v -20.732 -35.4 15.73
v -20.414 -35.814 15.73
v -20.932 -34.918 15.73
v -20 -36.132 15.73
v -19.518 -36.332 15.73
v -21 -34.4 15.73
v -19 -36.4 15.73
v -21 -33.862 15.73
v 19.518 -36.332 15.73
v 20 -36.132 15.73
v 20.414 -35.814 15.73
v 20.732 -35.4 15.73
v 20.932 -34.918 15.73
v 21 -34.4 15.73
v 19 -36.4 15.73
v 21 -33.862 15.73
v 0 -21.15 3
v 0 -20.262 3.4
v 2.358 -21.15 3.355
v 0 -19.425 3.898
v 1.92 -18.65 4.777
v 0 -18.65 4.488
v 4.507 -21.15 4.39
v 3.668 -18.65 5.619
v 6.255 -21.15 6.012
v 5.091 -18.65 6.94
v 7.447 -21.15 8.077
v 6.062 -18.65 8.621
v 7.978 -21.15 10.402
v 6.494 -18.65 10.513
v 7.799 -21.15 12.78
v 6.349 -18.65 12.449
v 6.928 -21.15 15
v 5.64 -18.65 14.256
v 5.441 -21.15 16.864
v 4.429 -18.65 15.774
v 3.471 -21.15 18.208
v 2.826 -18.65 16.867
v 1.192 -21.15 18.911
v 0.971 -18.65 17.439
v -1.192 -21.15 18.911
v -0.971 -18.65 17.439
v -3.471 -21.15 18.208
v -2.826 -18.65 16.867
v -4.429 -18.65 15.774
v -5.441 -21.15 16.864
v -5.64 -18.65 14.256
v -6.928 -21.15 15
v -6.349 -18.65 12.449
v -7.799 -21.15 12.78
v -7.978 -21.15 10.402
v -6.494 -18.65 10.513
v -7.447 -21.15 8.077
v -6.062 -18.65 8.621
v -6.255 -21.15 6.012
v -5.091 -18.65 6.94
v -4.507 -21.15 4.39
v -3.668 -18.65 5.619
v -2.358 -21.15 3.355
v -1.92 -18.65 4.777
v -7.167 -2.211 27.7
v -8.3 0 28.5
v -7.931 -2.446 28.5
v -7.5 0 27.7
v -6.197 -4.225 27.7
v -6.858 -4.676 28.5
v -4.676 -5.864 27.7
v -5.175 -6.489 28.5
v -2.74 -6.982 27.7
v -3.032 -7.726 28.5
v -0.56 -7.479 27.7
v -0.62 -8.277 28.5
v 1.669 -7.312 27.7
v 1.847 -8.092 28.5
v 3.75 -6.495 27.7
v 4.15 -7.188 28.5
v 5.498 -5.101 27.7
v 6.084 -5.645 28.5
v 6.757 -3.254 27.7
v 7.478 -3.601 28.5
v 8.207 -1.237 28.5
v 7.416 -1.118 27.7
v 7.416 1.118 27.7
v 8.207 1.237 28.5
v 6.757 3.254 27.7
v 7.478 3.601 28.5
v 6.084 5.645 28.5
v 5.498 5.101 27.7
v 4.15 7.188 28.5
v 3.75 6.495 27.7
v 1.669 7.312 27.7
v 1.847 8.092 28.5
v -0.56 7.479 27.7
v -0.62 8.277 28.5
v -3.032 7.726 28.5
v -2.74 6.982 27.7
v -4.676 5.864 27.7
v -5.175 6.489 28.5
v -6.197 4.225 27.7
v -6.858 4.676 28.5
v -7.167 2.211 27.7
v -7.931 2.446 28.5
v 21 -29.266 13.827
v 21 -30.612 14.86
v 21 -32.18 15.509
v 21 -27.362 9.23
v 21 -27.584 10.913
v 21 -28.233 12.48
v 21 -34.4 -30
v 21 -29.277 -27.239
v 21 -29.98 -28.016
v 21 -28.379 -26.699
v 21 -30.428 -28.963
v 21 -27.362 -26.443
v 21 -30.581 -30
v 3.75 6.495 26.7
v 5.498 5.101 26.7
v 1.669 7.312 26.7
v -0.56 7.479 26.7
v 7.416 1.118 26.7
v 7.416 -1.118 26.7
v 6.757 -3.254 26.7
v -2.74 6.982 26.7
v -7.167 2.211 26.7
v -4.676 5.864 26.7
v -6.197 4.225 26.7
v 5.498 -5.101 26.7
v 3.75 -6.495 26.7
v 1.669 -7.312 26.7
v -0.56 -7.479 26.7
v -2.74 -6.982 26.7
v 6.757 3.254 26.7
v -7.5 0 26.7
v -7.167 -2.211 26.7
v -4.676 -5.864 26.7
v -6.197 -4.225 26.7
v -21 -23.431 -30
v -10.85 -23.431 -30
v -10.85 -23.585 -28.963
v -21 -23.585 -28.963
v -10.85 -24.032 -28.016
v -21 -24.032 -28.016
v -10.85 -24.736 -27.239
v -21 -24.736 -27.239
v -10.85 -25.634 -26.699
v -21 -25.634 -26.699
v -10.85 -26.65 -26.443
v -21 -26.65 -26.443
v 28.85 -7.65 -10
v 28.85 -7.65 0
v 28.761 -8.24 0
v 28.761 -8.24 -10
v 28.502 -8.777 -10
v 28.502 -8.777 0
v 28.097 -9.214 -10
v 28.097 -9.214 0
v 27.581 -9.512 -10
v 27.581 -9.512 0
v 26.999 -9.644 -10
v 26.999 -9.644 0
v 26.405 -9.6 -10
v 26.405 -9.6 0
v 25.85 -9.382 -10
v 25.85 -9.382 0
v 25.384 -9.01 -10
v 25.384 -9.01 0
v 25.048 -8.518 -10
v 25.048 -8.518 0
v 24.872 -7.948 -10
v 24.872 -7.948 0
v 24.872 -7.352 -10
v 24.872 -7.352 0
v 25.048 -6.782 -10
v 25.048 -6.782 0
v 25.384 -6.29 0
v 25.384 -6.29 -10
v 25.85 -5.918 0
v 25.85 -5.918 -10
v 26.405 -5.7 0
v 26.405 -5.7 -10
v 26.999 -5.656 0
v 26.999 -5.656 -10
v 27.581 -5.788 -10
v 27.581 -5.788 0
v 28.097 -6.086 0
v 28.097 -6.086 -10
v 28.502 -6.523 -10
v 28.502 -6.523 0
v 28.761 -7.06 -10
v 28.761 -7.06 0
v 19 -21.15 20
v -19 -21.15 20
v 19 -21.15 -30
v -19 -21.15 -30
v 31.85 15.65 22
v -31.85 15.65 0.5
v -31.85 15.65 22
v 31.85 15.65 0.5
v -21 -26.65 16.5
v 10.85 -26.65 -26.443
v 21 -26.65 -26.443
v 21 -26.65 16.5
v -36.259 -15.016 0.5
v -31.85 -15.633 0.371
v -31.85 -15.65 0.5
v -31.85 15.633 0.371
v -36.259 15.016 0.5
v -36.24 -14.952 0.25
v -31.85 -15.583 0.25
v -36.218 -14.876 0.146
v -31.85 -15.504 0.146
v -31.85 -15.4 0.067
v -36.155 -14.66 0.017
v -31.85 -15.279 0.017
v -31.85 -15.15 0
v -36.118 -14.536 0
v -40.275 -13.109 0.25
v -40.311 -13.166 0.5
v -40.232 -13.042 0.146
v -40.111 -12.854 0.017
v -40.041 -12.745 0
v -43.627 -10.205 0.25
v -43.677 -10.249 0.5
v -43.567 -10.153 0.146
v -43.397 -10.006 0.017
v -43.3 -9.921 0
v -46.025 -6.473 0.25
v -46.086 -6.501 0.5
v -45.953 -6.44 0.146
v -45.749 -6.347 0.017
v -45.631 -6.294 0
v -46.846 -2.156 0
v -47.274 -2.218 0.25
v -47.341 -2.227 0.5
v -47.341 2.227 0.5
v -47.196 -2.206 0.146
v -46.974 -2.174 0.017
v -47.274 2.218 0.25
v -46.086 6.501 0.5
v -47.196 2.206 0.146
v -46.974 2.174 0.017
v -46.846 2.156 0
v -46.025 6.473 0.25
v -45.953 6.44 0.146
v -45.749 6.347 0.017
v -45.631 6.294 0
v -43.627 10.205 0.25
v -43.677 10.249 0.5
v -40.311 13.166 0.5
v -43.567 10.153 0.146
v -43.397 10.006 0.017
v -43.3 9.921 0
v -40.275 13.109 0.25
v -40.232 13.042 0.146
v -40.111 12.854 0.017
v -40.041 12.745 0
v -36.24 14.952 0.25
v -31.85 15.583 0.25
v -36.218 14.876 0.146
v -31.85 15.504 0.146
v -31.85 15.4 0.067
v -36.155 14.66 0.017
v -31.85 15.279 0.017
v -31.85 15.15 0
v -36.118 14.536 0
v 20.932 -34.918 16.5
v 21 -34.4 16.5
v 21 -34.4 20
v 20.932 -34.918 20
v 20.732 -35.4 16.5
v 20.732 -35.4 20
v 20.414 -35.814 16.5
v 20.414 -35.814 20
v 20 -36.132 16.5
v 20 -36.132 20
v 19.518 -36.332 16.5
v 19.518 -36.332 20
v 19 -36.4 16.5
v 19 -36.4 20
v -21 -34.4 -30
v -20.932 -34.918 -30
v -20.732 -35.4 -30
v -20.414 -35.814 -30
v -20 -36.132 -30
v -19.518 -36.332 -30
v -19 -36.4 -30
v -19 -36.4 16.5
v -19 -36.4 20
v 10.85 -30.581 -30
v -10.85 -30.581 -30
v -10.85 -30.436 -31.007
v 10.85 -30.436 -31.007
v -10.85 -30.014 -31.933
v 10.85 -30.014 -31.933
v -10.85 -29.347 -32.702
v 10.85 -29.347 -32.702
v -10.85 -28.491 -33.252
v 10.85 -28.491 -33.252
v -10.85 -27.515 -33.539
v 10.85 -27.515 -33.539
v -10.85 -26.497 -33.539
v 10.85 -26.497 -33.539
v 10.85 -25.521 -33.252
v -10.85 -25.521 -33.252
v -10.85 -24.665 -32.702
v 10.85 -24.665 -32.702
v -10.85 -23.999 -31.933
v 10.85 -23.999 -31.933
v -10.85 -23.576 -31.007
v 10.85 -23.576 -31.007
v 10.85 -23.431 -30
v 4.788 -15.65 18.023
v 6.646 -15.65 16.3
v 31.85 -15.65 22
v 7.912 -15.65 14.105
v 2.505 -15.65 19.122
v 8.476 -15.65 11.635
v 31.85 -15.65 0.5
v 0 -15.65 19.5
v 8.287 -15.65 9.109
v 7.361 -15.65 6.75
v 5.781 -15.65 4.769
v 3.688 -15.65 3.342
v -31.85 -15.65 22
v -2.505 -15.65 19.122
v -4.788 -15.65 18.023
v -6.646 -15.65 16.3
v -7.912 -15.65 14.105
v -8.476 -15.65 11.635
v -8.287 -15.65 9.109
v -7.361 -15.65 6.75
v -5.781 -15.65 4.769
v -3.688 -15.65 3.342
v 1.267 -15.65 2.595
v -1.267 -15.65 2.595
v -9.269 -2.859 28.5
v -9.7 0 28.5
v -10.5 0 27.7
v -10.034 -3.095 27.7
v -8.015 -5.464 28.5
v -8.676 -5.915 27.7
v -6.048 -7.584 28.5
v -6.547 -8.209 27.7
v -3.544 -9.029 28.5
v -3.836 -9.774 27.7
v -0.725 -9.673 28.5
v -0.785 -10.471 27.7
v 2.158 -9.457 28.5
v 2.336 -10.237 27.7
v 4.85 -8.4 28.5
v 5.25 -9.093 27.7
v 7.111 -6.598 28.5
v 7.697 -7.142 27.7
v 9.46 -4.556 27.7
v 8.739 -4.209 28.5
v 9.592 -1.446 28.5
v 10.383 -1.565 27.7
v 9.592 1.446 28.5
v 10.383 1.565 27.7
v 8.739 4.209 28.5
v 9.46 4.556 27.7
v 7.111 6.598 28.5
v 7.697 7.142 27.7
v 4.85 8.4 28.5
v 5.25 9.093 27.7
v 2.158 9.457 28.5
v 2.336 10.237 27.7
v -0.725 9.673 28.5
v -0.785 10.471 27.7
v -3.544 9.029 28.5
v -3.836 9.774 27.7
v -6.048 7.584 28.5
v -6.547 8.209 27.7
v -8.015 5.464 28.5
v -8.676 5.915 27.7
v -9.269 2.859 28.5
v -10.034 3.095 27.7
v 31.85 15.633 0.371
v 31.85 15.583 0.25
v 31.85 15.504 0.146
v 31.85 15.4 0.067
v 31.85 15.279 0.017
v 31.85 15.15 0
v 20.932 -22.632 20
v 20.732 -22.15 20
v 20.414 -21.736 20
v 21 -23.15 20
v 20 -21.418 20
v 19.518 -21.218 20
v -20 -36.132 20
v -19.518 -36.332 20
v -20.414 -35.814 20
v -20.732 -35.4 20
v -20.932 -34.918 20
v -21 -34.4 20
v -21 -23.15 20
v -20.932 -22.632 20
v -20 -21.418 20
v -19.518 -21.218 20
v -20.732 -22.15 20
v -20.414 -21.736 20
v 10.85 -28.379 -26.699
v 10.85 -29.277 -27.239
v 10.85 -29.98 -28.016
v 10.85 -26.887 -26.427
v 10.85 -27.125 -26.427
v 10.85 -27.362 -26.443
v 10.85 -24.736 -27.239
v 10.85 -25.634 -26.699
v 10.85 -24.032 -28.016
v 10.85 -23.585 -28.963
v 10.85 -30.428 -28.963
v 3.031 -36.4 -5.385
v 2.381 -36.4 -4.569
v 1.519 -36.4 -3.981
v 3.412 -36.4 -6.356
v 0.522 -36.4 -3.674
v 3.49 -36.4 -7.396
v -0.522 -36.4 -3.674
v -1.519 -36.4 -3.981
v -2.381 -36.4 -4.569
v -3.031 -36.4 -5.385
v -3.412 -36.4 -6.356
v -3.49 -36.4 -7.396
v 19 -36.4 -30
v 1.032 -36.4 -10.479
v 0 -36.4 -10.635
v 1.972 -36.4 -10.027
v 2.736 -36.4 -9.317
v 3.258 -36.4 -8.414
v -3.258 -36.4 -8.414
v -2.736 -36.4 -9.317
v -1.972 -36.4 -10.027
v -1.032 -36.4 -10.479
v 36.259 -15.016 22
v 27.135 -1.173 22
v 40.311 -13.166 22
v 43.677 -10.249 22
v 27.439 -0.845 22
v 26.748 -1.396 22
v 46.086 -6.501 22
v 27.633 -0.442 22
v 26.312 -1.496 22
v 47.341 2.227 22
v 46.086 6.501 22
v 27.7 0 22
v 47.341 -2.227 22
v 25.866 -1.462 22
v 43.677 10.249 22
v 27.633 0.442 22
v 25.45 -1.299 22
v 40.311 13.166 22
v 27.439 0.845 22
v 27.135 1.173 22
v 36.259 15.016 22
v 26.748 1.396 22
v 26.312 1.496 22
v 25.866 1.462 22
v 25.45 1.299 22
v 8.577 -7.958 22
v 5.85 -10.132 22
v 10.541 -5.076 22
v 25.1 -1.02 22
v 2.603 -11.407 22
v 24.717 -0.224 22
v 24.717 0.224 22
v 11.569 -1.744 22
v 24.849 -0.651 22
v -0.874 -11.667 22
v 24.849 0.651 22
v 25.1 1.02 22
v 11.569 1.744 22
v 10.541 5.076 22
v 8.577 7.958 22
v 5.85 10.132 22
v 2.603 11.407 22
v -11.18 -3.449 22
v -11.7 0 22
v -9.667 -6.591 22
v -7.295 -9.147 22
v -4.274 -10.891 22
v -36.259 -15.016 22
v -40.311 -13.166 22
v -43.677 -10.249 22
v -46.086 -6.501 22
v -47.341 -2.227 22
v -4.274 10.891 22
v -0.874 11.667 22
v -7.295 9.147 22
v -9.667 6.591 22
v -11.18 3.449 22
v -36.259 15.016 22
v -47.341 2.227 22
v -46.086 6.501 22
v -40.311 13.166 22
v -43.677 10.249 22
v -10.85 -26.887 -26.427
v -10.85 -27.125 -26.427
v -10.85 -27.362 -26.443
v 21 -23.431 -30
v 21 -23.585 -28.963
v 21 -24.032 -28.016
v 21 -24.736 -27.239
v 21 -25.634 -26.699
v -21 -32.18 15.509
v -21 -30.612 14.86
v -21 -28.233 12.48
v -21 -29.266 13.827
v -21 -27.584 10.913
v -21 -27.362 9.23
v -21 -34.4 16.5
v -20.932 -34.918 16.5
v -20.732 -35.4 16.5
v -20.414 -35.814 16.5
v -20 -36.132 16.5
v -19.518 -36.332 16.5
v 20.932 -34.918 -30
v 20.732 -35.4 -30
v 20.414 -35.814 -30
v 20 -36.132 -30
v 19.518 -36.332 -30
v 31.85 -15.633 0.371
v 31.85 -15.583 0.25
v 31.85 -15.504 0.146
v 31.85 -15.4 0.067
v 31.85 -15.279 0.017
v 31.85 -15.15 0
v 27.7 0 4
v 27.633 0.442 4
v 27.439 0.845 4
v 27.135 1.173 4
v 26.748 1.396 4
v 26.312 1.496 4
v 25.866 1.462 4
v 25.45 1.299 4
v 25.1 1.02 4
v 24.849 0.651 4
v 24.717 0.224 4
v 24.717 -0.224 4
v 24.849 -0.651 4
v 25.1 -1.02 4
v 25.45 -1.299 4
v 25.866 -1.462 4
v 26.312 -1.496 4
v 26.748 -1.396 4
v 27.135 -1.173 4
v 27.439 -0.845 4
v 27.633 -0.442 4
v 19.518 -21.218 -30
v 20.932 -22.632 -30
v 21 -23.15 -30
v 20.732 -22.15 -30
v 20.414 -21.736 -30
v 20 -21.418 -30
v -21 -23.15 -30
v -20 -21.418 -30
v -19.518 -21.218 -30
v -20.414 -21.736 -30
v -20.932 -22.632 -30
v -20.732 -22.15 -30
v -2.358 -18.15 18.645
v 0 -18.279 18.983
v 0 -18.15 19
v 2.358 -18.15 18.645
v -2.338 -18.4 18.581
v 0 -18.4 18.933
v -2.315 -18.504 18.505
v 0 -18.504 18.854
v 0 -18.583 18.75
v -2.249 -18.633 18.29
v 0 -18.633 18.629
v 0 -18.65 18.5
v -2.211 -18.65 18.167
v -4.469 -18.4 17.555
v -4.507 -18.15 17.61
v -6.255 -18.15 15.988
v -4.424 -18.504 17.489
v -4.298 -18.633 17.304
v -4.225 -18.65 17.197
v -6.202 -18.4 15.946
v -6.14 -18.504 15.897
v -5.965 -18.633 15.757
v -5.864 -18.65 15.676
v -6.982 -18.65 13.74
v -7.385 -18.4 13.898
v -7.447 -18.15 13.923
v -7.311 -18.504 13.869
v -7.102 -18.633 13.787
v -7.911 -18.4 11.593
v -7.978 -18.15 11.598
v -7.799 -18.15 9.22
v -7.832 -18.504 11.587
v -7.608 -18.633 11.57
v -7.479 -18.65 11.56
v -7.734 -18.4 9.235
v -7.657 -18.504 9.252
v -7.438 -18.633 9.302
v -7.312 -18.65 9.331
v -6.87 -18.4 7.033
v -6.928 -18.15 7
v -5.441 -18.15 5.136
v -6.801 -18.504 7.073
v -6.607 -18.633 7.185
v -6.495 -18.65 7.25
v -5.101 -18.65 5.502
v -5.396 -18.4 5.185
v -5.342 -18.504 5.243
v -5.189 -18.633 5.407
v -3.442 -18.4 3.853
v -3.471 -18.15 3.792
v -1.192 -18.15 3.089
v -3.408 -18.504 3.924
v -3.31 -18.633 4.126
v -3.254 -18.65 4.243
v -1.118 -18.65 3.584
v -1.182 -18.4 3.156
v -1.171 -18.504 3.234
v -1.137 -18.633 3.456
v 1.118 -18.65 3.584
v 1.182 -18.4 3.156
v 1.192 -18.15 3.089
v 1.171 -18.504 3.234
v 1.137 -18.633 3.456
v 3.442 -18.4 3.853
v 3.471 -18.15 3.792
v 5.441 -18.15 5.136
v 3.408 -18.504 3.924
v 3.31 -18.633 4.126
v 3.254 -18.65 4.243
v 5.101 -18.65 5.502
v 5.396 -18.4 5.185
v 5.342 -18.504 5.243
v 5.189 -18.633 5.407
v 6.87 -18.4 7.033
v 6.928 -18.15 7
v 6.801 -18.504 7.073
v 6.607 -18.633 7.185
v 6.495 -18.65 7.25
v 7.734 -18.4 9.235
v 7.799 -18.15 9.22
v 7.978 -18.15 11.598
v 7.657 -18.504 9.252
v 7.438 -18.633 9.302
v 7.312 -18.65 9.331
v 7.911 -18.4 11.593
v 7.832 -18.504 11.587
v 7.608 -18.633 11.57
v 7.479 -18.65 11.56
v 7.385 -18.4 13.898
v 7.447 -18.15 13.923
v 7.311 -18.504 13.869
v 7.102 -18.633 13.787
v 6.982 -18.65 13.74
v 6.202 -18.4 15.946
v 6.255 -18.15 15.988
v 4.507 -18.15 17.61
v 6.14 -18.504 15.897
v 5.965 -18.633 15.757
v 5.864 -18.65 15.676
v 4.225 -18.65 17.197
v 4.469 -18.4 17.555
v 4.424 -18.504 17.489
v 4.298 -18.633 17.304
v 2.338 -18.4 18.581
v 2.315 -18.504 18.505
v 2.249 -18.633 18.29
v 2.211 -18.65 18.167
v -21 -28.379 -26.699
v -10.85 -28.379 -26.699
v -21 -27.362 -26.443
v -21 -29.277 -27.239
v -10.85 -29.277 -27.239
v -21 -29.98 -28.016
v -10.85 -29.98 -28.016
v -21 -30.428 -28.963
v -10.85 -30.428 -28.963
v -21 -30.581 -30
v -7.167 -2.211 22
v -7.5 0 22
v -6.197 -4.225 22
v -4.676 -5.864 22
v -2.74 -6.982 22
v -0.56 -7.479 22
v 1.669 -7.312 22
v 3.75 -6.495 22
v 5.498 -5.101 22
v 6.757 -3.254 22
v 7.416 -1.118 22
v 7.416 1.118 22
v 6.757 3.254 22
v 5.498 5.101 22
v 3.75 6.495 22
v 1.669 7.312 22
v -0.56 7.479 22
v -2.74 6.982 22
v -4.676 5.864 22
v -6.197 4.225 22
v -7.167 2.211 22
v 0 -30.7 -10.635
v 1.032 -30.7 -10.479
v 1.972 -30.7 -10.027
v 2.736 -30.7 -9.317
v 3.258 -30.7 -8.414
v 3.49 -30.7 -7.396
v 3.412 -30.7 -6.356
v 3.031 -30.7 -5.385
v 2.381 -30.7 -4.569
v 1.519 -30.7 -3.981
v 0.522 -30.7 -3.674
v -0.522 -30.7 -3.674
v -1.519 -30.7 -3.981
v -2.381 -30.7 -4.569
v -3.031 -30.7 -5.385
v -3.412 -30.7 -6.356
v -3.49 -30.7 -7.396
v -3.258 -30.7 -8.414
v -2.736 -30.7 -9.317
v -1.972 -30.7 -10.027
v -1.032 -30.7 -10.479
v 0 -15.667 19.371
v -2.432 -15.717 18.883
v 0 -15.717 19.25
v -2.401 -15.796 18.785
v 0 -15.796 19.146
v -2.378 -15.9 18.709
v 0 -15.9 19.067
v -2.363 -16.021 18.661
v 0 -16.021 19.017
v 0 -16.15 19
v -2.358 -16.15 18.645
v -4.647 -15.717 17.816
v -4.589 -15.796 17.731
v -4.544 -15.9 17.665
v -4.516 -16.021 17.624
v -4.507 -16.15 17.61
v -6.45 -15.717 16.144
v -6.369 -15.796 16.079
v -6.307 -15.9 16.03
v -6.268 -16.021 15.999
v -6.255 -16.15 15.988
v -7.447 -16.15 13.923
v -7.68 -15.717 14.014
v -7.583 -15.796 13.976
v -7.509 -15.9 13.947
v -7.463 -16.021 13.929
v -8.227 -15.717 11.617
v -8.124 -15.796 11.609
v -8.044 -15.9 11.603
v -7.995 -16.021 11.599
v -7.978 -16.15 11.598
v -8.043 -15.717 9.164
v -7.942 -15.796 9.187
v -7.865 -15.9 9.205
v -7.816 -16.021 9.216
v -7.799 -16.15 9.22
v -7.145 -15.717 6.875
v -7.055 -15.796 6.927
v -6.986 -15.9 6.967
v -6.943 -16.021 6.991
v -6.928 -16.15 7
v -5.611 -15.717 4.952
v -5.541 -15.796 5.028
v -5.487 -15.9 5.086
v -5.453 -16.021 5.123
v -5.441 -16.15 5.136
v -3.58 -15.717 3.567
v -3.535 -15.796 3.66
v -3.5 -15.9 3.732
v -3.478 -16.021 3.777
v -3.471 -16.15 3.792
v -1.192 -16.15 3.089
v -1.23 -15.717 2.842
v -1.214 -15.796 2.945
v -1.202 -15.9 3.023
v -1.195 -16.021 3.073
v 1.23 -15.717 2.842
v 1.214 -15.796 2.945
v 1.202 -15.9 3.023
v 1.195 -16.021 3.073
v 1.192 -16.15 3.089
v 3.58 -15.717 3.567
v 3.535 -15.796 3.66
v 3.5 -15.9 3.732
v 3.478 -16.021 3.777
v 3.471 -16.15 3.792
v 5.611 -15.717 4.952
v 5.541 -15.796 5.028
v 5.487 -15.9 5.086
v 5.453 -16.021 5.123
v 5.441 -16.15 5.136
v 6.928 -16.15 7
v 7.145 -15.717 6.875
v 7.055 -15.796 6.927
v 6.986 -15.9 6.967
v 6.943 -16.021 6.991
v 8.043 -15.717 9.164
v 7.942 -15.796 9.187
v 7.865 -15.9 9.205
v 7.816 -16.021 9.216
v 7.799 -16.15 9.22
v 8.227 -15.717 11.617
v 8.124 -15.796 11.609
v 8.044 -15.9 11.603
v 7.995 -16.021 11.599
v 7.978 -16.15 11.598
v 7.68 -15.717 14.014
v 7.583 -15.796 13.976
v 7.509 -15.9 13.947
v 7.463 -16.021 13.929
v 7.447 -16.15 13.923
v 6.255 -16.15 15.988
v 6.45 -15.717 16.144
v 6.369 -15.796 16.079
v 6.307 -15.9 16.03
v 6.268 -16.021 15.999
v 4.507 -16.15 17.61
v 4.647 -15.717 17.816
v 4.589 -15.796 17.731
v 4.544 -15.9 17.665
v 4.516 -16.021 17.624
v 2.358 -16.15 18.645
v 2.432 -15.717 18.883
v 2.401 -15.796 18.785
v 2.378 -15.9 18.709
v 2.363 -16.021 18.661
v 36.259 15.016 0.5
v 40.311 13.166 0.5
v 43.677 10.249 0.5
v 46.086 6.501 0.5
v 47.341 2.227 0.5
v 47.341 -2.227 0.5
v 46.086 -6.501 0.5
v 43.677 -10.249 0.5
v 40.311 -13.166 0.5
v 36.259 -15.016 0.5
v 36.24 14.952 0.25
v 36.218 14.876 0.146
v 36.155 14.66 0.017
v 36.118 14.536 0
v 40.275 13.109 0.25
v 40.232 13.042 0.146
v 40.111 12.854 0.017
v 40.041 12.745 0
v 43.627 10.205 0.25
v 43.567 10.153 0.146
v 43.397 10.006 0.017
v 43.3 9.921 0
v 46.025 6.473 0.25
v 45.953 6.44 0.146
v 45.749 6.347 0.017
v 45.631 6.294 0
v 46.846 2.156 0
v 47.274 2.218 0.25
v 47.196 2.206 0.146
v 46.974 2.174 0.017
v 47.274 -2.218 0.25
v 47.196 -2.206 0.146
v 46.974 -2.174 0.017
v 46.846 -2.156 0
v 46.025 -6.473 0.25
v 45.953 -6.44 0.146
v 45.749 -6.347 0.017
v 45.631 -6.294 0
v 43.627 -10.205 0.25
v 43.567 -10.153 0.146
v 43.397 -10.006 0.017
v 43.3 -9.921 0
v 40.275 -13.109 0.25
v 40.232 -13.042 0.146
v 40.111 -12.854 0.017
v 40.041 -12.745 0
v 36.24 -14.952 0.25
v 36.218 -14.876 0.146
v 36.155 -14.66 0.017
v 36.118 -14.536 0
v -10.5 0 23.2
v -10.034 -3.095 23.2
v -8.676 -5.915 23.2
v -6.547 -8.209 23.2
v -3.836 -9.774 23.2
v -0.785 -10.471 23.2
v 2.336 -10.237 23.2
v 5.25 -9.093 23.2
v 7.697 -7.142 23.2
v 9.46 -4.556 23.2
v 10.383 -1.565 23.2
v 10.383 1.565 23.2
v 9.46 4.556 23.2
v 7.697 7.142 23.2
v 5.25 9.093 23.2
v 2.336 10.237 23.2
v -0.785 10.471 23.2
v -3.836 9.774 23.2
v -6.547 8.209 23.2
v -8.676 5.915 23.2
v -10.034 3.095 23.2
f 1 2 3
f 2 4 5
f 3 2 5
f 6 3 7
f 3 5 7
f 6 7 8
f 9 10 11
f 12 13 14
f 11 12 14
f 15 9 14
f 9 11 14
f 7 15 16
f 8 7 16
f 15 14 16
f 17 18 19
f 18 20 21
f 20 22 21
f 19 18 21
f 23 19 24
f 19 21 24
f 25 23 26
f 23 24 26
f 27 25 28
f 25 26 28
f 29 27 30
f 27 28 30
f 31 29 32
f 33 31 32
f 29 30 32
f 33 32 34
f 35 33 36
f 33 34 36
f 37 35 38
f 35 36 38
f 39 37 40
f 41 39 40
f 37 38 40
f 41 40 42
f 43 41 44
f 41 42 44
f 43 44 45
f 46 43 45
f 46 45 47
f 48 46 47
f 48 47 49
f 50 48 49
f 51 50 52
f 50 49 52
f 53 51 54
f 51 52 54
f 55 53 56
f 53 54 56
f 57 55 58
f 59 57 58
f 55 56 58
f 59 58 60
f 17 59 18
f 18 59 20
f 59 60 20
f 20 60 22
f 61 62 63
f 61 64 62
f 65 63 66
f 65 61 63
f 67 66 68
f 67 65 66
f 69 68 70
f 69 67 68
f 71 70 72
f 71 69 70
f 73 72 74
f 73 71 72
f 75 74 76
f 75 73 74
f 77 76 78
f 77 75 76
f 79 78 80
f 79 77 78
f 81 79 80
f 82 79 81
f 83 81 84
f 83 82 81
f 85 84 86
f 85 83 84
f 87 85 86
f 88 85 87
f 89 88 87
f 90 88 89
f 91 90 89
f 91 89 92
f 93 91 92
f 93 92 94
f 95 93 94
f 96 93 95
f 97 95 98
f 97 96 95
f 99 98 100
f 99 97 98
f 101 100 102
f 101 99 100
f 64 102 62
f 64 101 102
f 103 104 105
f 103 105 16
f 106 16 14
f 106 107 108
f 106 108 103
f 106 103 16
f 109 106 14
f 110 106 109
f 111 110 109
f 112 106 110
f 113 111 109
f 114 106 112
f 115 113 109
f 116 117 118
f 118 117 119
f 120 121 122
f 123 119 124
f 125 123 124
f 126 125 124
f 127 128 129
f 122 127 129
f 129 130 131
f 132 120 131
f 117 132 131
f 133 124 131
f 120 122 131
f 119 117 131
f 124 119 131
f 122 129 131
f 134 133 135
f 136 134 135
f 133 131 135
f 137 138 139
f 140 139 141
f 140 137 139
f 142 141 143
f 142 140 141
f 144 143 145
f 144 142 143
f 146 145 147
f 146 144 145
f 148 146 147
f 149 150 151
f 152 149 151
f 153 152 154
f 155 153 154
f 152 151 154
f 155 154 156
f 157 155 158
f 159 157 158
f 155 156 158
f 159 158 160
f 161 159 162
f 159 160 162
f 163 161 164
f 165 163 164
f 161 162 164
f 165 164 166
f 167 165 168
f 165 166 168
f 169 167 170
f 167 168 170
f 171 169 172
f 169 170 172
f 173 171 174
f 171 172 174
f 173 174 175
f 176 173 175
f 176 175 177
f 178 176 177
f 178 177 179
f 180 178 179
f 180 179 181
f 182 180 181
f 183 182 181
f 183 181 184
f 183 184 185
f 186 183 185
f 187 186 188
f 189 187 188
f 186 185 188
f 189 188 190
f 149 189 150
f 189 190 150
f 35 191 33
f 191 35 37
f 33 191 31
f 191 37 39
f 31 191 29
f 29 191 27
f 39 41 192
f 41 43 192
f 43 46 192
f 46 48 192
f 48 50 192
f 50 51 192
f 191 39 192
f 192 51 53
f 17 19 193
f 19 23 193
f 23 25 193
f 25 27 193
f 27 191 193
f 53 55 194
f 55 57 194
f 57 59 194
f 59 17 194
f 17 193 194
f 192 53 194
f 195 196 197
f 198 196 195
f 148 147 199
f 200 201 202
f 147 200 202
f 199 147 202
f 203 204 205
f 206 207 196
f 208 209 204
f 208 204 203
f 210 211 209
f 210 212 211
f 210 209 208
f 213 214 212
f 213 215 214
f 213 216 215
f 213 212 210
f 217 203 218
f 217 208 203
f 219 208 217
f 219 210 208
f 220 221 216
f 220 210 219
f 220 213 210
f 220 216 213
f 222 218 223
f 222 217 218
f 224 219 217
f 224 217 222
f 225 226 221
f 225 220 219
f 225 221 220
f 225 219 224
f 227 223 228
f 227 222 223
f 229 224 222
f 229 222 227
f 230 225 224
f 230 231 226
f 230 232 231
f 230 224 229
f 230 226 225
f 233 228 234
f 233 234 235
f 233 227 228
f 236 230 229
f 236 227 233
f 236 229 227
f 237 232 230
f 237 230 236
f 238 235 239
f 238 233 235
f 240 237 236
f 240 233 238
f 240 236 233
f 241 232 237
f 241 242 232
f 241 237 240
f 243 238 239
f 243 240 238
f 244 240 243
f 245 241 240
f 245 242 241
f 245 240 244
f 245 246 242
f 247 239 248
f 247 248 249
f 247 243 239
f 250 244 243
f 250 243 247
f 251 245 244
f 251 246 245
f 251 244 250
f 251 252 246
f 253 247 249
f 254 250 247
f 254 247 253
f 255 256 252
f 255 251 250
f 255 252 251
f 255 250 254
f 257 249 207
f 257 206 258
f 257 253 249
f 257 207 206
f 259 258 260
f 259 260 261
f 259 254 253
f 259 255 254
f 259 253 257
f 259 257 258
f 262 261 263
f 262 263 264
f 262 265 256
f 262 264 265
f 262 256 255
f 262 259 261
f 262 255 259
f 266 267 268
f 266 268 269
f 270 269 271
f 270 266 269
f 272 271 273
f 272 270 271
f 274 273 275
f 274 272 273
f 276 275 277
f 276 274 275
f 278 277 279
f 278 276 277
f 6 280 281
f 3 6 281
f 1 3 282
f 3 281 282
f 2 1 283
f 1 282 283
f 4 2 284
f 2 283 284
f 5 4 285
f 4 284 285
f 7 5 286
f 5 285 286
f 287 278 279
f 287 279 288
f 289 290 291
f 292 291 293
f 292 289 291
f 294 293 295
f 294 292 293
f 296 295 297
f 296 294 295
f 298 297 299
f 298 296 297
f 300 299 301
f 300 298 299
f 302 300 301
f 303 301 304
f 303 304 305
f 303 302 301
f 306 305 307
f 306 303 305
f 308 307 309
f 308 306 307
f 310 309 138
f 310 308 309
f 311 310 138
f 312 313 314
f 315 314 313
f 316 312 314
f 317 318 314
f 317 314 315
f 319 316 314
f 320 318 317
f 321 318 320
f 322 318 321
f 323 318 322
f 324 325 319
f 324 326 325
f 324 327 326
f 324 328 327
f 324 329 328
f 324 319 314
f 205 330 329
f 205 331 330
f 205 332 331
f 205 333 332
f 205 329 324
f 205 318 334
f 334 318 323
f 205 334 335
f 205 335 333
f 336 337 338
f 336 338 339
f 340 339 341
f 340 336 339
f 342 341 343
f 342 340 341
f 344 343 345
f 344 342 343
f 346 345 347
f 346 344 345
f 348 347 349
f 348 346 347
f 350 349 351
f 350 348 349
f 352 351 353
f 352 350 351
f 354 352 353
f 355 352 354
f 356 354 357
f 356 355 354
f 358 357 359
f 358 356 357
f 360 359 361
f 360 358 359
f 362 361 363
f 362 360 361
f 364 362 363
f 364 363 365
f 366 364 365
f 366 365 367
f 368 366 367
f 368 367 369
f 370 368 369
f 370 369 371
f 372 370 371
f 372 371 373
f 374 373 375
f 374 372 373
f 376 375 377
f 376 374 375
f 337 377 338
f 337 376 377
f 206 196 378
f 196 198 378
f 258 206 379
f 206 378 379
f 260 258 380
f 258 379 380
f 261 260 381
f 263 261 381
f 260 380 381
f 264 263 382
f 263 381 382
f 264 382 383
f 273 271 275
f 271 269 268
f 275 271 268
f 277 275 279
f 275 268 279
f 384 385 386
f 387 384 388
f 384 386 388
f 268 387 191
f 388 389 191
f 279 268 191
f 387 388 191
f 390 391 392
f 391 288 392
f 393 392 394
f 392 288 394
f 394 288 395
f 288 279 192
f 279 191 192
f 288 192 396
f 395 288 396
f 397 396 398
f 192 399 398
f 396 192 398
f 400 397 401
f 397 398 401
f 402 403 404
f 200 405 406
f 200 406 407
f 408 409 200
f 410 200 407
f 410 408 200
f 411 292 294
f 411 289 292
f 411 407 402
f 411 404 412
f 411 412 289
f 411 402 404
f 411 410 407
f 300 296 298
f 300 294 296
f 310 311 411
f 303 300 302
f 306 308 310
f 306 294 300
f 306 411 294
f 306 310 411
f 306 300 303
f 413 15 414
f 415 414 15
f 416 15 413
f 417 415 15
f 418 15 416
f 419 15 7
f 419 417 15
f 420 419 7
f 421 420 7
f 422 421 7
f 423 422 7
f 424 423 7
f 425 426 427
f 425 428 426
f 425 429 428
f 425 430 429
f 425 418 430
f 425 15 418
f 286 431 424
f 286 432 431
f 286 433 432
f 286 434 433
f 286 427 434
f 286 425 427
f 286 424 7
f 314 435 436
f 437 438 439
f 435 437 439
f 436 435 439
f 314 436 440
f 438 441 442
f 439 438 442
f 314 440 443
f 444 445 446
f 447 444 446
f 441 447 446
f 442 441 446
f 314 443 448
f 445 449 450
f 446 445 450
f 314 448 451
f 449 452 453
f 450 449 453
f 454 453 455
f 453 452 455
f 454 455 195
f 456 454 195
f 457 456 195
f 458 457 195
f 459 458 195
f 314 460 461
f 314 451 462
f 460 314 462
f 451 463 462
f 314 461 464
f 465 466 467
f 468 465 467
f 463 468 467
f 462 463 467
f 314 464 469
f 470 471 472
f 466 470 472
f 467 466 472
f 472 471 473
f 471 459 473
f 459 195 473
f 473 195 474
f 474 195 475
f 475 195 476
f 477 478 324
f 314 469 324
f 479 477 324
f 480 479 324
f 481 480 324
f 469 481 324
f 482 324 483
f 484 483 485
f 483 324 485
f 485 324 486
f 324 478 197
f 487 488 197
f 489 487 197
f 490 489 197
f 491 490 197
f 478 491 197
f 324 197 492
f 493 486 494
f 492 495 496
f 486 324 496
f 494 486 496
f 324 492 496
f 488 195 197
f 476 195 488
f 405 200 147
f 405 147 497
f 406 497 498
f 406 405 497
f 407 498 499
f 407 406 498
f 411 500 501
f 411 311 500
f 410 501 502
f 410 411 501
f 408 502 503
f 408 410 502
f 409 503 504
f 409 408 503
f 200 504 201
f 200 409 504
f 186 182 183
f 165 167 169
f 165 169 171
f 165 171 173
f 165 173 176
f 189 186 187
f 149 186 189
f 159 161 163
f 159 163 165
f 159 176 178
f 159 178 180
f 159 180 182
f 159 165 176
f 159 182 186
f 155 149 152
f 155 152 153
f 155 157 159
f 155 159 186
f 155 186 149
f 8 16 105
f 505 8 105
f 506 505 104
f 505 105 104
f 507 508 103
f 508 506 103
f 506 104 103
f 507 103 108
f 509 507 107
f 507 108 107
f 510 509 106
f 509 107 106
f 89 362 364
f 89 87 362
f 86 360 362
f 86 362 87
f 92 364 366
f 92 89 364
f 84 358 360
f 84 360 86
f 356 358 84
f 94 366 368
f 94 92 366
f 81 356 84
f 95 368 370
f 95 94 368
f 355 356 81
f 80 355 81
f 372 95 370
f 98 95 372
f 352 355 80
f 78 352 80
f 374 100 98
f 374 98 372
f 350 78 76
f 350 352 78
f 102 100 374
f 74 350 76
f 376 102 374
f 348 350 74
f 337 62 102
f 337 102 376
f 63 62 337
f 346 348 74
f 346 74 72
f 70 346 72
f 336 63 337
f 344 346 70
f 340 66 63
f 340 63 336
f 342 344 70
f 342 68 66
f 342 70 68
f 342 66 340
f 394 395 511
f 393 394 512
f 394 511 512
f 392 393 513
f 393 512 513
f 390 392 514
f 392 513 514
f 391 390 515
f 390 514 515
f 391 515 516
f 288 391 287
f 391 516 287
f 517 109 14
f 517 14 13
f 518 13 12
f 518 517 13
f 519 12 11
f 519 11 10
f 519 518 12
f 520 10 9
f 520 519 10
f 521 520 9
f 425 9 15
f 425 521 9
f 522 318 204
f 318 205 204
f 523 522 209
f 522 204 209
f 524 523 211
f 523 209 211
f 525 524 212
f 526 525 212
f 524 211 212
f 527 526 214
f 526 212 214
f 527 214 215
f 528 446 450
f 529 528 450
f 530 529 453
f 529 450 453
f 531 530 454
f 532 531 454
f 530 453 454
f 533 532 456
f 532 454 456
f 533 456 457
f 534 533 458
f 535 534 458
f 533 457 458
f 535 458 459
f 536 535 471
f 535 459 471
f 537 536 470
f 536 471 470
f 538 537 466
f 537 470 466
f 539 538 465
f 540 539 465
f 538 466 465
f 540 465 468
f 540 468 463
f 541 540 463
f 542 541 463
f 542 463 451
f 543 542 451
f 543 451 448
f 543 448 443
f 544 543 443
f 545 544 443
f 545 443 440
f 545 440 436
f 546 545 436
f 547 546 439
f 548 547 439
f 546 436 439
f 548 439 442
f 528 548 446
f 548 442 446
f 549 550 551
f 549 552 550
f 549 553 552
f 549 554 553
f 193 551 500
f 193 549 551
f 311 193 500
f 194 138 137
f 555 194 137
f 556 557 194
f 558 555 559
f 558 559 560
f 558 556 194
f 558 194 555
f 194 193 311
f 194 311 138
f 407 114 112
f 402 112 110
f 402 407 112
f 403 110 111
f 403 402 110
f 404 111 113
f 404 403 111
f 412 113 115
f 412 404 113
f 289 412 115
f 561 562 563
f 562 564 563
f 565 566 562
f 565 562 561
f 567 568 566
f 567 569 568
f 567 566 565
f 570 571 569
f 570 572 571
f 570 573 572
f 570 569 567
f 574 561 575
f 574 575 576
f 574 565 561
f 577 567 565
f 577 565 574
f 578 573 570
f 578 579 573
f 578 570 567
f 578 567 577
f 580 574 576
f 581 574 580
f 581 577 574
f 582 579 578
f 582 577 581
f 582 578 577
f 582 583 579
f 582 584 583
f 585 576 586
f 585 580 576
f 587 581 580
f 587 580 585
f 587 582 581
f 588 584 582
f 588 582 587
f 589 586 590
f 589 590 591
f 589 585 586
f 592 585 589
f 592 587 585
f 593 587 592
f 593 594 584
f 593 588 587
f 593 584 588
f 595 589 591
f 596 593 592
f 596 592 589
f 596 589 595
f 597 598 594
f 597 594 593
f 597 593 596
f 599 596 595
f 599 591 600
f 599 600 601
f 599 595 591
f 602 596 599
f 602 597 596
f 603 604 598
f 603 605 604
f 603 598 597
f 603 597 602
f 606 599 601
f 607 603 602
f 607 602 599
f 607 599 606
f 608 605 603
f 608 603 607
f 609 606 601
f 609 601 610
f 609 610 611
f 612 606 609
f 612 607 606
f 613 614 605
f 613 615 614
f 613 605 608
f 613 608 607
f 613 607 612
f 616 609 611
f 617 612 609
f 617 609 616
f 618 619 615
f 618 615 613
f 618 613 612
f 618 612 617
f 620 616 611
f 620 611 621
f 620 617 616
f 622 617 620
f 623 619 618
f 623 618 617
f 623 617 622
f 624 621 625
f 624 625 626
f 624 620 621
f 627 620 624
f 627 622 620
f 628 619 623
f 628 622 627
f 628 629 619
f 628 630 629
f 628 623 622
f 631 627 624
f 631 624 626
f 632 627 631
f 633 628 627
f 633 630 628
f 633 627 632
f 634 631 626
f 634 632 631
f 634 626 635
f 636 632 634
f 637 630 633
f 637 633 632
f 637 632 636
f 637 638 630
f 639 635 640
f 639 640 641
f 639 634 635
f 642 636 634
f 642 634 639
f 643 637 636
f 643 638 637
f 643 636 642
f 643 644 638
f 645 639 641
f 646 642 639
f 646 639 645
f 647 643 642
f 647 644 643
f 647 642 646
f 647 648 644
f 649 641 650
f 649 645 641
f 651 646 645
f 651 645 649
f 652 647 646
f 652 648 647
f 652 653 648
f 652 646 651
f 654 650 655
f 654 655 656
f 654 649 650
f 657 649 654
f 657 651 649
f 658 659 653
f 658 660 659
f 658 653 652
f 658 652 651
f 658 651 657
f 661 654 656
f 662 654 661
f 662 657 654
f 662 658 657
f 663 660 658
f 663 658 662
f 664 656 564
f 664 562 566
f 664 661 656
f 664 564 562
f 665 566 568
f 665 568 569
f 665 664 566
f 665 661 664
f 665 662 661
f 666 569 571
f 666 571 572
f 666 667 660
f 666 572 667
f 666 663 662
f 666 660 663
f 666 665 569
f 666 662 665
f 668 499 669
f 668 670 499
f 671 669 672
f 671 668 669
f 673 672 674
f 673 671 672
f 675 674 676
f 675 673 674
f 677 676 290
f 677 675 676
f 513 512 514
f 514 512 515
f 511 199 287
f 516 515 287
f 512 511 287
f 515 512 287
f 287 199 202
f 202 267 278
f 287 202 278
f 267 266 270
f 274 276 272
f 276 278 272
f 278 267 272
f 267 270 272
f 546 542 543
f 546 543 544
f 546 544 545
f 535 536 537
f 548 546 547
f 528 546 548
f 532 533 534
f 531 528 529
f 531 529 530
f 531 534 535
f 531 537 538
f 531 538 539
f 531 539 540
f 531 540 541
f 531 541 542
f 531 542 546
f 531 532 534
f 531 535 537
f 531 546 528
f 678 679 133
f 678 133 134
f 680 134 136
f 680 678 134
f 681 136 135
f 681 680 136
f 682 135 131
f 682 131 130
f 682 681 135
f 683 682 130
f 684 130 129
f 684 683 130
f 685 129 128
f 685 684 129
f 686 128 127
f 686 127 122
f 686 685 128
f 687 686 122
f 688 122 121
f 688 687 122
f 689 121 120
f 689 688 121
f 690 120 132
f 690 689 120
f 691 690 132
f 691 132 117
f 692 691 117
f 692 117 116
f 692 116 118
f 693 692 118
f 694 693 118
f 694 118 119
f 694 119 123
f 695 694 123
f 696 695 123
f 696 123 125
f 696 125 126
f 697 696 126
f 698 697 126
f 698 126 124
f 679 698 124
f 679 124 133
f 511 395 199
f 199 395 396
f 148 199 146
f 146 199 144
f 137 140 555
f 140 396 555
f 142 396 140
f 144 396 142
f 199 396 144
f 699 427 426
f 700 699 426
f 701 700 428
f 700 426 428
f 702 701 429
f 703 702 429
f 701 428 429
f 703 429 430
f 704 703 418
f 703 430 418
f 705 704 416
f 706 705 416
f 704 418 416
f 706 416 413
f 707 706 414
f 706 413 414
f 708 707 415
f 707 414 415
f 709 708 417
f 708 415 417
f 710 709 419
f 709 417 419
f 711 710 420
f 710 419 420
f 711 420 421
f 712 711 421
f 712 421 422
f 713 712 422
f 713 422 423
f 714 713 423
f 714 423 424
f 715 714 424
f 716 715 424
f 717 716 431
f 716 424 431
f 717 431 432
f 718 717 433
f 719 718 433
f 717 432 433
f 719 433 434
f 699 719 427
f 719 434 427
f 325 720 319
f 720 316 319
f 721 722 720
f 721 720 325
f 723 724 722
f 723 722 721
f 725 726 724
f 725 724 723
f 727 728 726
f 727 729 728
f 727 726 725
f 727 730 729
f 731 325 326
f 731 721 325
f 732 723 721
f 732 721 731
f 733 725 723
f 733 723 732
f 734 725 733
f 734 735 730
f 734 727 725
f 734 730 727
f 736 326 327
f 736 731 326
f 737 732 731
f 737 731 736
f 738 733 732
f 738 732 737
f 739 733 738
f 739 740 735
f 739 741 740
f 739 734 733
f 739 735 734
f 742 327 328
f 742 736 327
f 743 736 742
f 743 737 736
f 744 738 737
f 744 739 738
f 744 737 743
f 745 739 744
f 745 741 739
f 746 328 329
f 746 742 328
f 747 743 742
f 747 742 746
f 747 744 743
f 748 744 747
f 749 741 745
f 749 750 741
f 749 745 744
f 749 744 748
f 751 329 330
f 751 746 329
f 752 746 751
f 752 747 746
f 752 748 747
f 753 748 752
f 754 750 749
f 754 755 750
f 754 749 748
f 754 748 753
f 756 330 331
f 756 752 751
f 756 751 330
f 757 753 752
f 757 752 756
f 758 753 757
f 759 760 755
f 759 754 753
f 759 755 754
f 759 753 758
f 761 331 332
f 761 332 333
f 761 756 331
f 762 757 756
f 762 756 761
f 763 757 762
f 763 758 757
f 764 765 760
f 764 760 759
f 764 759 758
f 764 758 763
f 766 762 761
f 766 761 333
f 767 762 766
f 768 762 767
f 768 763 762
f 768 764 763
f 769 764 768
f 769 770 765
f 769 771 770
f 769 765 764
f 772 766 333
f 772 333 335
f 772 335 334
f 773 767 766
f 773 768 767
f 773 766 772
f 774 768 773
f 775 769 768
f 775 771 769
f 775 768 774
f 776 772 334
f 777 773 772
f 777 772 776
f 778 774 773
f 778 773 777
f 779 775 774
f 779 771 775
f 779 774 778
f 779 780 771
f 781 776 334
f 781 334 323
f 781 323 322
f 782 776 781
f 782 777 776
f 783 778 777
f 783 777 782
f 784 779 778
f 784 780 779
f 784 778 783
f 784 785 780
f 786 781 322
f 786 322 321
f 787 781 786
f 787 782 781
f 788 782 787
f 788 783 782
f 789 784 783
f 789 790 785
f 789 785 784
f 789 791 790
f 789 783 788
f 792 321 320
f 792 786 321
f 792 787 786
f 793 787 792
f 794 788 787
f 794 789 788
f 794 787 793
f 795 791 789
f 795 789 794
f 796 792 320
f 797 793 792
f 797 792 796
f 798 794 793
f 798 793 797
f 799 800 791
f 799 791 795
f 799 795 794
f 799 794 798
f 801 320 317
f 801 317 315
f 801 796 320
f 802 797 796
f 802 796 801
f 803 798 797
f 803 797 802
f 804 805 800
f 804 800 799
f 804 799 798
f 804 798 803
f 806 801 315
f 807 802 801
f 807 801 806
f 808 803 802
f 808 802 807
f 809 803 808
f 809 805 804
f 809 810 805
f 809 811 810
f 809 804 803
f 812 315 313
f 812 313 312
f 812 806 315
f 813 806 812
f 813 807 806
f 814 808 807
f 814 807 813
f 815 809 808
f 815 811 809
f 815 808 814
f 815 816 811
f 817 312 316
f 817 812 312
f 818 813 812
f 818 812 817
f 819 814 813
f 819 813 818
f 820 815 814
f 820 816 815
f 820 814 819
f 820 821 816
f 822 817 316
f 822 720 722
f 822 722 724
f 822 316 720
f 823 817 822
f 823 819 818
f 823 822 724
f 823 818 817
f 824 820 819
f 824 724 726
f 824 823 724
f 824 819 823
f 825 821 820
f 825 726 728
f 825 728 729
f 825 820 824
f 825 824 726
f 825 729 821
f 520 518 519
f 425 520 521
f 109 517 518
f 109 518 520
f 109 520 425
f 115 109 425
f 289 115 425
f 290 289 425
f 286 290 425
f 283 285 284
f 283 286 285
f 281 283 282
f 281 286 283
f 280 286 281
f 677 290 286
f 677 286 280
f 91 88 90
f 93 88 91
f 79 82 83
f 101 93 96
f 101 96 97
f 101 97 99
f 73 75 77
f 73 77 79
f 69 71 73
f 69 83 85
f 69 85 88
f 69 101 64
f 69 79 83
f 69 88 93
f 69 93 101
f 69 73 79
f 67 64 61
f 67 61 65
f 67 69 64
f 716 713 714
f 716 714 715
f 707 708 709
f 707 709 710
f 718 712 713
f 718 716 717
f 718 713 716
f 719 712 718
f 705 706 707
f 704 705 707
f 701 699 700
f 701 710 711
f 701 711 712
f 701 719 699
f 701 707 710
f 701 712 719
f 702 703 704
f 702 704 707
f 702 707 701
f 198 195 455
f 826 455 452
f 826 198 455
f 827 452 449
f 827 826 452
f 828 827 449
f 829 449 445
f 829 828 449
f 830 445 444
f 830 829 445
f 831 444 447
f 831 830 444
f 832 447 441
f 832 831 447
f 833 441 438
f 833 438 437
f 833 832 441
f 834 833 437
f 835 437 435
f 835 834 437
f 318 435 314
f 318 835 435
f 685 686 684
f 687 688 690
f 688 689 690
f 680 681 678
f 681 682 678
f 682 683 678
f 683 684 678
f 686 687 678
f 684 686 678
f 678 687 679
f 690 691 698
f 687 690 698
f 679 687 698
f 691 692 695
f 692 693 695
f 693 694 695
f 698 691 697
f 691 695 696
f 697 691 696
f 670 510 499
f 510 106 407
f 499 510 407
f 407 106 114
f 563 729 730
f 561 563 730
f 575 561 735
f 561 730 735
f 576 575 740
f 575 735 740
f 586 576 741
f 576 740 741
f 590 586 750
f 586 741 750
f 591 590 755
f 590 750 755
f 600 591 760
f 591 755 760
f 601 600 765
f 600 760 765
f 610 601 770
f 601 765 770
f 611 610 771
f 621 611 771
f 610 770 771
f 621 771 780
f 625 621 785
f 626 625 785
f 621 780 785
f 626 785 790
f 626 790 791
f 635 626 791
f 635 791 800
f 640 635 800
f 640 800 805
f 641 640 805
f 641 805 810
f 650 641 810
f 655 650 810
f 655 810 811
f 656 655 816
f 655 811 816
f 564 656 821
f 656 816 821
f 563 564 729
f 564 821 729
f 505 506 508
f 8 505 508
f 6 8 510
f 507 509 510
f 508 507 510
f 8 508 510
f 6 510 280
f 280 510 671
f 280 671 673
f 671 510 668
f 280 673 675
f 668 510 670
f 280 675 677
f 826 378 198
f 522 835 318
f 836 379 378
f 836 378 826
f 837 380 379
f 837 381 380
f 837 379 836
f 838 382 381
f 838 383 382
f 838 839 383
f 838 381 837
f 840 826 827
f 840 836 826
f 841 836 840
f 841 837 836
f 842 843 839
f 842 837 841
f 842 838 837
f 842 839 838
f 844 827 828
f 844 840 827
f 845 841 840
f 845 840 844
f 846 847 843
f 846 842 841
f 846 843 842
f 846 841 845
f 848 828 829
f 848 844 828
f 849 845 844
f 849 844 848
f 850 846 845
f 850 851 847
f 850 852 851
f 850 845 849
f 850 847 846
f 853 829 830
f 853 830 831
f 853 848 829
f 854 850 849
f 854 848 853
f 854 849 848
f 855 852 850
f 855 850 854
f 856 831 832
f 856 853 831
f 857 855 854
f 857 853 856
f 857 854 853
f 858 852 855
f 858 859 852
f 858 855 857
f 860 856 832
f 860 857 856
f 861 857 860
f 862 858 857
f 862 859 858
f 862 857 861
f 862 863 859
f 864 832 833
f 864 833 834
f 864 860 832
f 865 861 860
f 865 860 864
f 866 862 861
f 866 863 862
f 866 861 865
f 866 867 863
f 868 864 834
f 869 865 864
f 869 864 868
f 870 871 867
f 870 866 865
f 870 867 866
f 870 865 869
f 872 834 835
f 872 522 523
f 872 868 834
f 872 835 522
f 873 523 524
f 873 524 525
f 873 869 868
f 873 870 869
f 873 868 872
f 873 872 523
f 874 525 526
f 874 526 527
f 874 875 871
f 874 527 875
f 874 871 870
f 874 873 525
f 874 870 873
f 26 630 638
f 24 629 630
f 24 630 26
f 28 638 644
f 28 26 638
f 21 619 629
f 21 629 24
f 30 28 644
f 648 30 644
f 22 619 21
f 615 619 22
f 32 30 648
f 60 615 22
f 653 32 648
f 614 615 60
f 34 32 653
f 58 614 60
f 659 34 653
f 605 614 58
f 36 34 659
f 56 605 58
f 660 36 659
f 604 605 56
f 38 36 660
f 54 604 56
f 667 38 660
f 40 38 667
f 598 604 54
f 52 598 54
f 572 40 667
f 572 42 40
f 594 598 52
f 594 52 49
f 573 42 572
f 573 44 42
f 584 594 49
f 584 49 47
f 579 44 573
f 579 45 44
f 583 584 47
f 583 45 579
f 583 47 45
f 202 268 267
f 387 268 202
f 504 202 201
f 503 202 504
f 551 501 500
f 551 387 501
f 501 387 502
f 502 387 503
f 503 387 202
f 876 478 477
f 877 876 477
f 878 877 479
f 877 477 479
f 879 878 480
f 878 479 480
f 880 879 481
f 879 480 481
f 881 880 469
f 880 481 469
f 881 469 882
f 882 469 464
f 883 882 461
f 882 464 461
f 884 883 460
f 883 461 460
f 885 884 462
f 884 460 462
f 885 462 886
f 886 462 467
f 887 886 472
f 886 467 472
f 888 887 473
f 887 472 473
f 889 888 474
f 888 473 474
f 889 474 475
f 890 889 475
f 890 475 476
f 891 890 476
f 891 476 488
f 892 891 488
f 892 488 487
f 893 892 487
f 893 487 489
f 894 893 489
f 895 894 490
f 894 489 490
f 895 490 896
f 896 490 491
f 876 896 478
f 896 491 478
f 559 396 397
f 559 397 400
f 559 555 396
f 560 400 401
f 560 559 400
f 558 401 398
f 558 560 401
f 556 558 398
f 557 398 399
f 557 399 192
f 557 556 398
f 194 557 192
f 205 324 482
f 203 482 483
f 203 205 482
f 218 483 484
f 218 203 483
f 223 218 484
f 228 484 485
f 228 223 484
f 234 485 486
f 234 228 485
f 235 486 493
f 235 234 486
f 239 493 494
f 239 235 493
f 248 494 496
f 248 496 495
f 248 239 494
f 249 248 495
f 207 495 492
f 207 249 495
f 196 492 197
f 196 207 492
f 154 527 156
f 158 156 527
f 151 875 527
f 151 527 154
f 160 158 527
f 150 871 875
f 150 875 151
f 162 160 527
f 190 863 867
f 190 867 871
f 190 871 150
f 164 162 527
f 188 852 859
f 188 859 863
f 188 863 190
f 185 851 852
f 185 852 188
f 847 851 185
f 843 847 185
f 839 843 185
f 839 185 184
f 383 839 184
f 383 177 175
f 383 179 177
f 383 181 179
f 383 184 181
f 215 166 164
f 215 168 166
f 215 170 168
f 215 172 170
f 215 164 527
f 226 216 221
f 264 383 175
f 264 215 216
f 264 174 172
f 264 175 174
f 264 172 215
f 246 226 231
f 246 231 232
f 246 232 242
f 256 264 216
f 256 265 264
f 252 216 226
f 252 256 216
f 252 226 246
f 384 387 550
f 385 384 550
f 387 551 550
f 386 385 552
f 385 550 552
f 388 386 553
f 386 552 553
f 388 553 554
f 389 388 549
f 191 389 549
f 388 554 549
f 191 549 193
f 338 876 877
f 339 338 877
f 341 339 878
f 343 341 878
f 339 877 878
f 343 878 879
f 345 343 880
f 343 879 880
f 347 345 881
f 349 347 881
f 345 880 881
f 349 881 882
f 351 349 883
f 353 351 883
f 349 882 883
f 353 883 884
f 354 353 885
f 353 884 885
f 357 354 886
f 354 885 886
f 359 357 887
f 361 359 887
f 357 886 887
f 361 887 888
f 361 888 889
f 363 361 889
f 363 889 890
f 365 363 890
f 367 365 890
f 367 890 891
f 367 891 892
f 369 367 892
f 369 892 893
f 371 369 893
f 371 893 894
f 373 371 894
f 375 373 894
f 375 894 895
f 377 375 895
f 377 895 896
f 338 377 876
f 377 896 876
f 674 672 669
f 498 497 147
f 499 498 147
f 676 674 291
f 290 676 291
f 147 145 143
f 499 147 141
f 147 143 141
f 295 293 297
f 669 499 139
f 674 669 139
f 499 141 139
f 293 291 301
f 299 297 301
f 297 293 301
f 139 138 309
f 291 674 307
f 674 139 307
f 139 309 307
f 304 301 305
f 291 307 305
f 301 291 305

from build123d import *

# Parameters (mm, degrees)
RESSALTO_EXTRUS_O1_DEPTH   = 22
ESBO_O2_R                  = 10.5
ESBO_O2_R_2                = 7.5
RESSALTO_EXTRUS_O2_DEPTH   = 6.5
CHANFRO1_SIZE              = 0.8
CHANFRO2_SIZE              = 1.2
RESSALTO_EXTRUS_O3_START   = -1
ESBO_O3_R                  = 7.5
RESSALTO_EXTRUS_O3_DEPTH   = 1
ESBO_O4_R                  = 1.5
CORTE_EXTRUS_O1_DEPTH      = 18
ESBO_O5_R                  = 8
RESSALTO_EXTRUS_O4_DEPTH   = 3
FILETE2_R                  = 0.5
ESBO_O6_W                  = 42
ESBO_O6_H                  = 50
RESSALTO_EXTRUS_O5_DEPTH   = 15.25
FILETE3_R                  = 2
CORTE_EXTRUS_O2_DEPTH      = 19
CORTE_EXTRUS_O2_DEPTH_BACK = 70.25
CORTE_EXTRUS_O3_DEPTH      = 36
CORTE_EXTRUS_O3_DEPTH_BACK = 34.25
ESBO_O8_R                  = 3.575
ESBO_O9_R                  = 3.575
RESSALTO_EXTRUS_O6_DEPTH   = 10.85
ESBO_O10_R                 = 3.5
CORTE_EXTRUS_O4_DEPTH      = 5.7
ESBO_O13_R                 = 2
RESSALTO_EXTRUS_O7_DEPTH   = 10


with BuildPart() as part:
    # Esboço1 → Ressalto-extrusão1 (new body)
    with BuildSketch(Plane.XY):
        with BuildLine():
            Line((-31.85, 15.65), (31.85, 15.65))
            ThreePointArc((31.85, 15.65), (47.5, 0), (31.85, -15.65))
            Line((31.85, -15.65), (-31.85, -15.65))
            ThreePointArc((-31.85, -15.65), (-47.5, 0), (-31.85, 15.65))
        make_face()
    extrude(amount=RESSALTO_EXTRUS_O1_DEPTH)

    # Esboço2 → Ressalto-extrusão2 (add)
    with BuildSketch(Plane.XY.offset(22)):
        with Locations(Location((0, 0, 0), (0, 0, 180))):
            Circle(ESBO_O2_R)
        with Locations(Location((0, 0, 0), (0, 0, 180))):
            Circle(ESBO_O2_R_2, mode=Mode.SUBTRACT)
    extrude(amount=RESSALTO_EXTRUS_O2_DEPTH)

    # Chanfro1
    chanfro1_edges = [part.edges().sort_by_distance(p)[0] for p in [
        (10.5, 0, 28.5),
        (7.5, 0, 28.5),
    ]]
    chamfer(chanfro1_edges, length=CHANFRO1_SIZE)

    # Chanfro2
    chanfro2_edges = [part.edges().sort_by_distance(p)[0] for p in [
        (10.5, 0, 22),
    ]]
    chamfer(chanfro2_edges, length=CHANFRO2_SIZE)

    # Esboço3 → Ressalto-extrusão3 (add)
    with BuildSketch(Plane.XY.offset(27.7).offset(RESSALTO_EXTRUS_O3_START)):
        with Locations(Location((0, 0, 0), (0, 0, 180))):
            Circle(ESBO_O3_R)
    extrude(amount=RESSALTO_EXTRUS_O3_DEPTH)

    # Esboço4 → Corte-extrusão1 (cut)
    with BuildSketch(Plane.XY.offset(22)):
        with Locations((26.2, 0)):
            Circle(ESBO_O4_R)
    extrude(amount=-CORTE_EXTRUS_O1_DEPTH, mode=Mode.SUBTRACT)

    # Esboço5 → Ressalto-extrusão4 (add)
    with BuildSketch(Plane.XZ.offset(15.65)):
        with Locations(Location((0, 11, 0), (0, 0, 90))):
            Circle(ESBO_O5_R)
    extrude(amount=RESSALTO_EXTRUS_O4_DEPTH)

    # Filete2
    filete2_edges = [part.edges().sort_by_distance(p)[0] for p in [
        (0, -15.65, 3),
        (0, -18.65, 3),
        (0, 15.65, 0),
        (47.5, 0, 0),
        (0, -15.65, 0),
        (-47.5, 0, 0),
    ]]
    fillet(filete2_edges, radius=FILETE2_R)



with BuildPart() as body_2:
    # Esboço6 → Ressalto-extrusão5 (new body)
    with BuildSketch(Plane(origin=(0, -21.15, 0), x_dir=(-1, 0, 0), z_dir=(0, -1, 0))):
        with Locations((0, 5)):
            Rectangle(ESBO_O6_W, ESBO_O6_H)
    extrude(amount=RESSALTO_EXTRUS_O5_DEPTH)

    # Filete3
    filete3_edges = [body_2.edges().sort_by_distance(p)[0] for p in [
        (-21, -36.4, -5),
        (21, -36.4, -5),
        (-21, -21.15, -5),
        (21, -21.15, -5),
    ]]
    fillet(filete3_edges, radius=FILETE3_R)

    # Esboço7 → Corte-extrusão2 (cut, two sides: drawn at the far end of the back side and taken through both)
    with BuildSketch(Plane.ZY.offset(21).offset(-CORTE_EXTRUS_O2_DEPTH_BACK)):
        with BuildLine():
            Line((-30, -26.65), (16.5, -26.65))
            Line((16.5, -26.65), (16.5, -38.046721954))
            Line((16.5, -38.046721954), (15.730351624, -38.046721954))
            Line((15.730351624, -38.046721954), (15.730351624, -33.8624466))
            ThreePointArc((15.730351624, -33.8624466), (13.826545702, -29.266252522), (9.230351624, -27.3624466))
            Line((9.230351624, -27.3624466), (-30, -27.3624466))
            Line((-30, -27.3624466), (-31.616650622, -27.3624466))
            Line((-31.616650622, -27.3624466), (-31.616650622, -26.65))
            Line((-31.616650622, -26.65), (-30, -26.65))
        make_face()
    extrude(amount=CORTE_EXTRUS_O2_DEPTH + CORTE_EXTRUS_O2_DEPTH_BACK, mode=Mode.SUBTRACT)


with BuildPart() as corte_extrus_o2_piece_1:
    # of the separate pieces the step leaves, piece 1, a body of its own (corte_extrus_o2_pieces)
    add(body_2.part.solids().sort_by_distance((-21, -27.3624466, -30))[0])


with BuildPart() as corte_extrus_o2_piece_2:
    # of the separate pieces the step leaves, piece 2, a body of its own (corte_extrus_o2_pieces)
    add(body_2.part.solids().sort_by_distance((-21, -23.15, 20))[0])


with BuildPart() as corte_extrus_o3_tool:
    # Esboço8 → Corte-extrusão3 (new, two sides: drawn at the far end of the back side and taken through both)
    with BuildSketch(Plane(origin=(0, 0, 0), x_dir=(0, 0, -1), z_dir=(1, 0, 0)).offset(-CORTE_EXTRUS_O3_DEPTH_BACK)):
        with Locations((30, -27.0062233)):
            Circle(ESBO_O8_R)
    extrude(amount=CORTE_EXTRUS_O3_DEPTH + CORTE_EXTRUS_O3_DEPTH_BACK)


with BuildPart() as corte_extrus_o2_piece_1_1:
    add(corte_extrus_o2_piece_1.part)

    # Corte-extrusão3: cut by corte_extrus_o3_tool
    add(corte_extrus_o3_tool.part, mode=Mode.SUBTRACT)



with BuildPart() as corte_extrus_o2_piece_2_1:
    add(corte_extrus_o2_piece_2.part)

    # Corte-extrusão3: cut by corte_extrus_o3_tool
    add(corte_extrus_o3_tool.part, mode=Mode.SUBTRACT)


with BuildPart() as corte_extrus_o2_piece_1_2:
    add(corte_extrus_o2_piece_1_1.part)

    add(corte_extrus_o2_piece_2_1.part)  # Ressalto-extrusão6 merges Corte-extrusão2 piece 2
    # Esboço9 → Ressalto-extrusão6 (add, symmetric)
    with BuildSketch(Plane(origin=(0, 0, 0), x_dir=(0, 0, -1), z_dir=(1, 0, 0))):
        with Locations((30, -27.0062233)):
            Circle(ESBO_O9_R)
    extrude(amount=RESSALTO_EXTRUS_O6_DEPTH, both=True)

    # Esboço10 → Corte-extrusão4 (cut)
    with BuildSketch(Plane.XZ.offset(36.4)):
        with Locations(Location((0, -7.134824188, 0), (0, 0, 270))):
            Circle(ESBO_O10_R)
    extrude(amount=-CORTE_EXTRUS_O4_DEPTH, mode=Mode.SUBTRACT)


with BuildPart() as part_1:
    add(part.part)

    add(corte_extrus_o2_piece_1_2.part)  # Revolução1 merges Corte-extrusão2 piece 1
    # Esboço12 → Revolução1 (revolve)
    with BuildSketch(Plane.XY.offset(11), mode=Mode.PRIVATE) as revolu_o1_sk:
        with BuildLine():
            Line((0, -15.65), (0, -21.15))
            Line((0, -21.15), (-8, -21.15))
            ThreePointArc((-8, -21.15), (-4.85412196, -17.157640786), (0, -15.65))
        make_face()
    revolve(revolu_o1_sk.sketch.rotate(Axis((0, -15.65, 11), (0, -1, 0)), 90), axis=Axis((0, -15.65, 11), (0, -1, 0)))

    # Esboço13 → Ressalto-extrusão7 (add)
    with BuildSketch(Plane(origin=(0, 0, 0), x_dir=(-1, 0, 0), z_dir=(0, 0, -1))):
        with Locations(Location((-26.85, -7.65, 0), (0, 0, 180))):
            Circle(ESBO_O13_R)
    extrude(amount=RESSALTO_EXTRUS_O7_DEPTH)


solid = part_1.part
